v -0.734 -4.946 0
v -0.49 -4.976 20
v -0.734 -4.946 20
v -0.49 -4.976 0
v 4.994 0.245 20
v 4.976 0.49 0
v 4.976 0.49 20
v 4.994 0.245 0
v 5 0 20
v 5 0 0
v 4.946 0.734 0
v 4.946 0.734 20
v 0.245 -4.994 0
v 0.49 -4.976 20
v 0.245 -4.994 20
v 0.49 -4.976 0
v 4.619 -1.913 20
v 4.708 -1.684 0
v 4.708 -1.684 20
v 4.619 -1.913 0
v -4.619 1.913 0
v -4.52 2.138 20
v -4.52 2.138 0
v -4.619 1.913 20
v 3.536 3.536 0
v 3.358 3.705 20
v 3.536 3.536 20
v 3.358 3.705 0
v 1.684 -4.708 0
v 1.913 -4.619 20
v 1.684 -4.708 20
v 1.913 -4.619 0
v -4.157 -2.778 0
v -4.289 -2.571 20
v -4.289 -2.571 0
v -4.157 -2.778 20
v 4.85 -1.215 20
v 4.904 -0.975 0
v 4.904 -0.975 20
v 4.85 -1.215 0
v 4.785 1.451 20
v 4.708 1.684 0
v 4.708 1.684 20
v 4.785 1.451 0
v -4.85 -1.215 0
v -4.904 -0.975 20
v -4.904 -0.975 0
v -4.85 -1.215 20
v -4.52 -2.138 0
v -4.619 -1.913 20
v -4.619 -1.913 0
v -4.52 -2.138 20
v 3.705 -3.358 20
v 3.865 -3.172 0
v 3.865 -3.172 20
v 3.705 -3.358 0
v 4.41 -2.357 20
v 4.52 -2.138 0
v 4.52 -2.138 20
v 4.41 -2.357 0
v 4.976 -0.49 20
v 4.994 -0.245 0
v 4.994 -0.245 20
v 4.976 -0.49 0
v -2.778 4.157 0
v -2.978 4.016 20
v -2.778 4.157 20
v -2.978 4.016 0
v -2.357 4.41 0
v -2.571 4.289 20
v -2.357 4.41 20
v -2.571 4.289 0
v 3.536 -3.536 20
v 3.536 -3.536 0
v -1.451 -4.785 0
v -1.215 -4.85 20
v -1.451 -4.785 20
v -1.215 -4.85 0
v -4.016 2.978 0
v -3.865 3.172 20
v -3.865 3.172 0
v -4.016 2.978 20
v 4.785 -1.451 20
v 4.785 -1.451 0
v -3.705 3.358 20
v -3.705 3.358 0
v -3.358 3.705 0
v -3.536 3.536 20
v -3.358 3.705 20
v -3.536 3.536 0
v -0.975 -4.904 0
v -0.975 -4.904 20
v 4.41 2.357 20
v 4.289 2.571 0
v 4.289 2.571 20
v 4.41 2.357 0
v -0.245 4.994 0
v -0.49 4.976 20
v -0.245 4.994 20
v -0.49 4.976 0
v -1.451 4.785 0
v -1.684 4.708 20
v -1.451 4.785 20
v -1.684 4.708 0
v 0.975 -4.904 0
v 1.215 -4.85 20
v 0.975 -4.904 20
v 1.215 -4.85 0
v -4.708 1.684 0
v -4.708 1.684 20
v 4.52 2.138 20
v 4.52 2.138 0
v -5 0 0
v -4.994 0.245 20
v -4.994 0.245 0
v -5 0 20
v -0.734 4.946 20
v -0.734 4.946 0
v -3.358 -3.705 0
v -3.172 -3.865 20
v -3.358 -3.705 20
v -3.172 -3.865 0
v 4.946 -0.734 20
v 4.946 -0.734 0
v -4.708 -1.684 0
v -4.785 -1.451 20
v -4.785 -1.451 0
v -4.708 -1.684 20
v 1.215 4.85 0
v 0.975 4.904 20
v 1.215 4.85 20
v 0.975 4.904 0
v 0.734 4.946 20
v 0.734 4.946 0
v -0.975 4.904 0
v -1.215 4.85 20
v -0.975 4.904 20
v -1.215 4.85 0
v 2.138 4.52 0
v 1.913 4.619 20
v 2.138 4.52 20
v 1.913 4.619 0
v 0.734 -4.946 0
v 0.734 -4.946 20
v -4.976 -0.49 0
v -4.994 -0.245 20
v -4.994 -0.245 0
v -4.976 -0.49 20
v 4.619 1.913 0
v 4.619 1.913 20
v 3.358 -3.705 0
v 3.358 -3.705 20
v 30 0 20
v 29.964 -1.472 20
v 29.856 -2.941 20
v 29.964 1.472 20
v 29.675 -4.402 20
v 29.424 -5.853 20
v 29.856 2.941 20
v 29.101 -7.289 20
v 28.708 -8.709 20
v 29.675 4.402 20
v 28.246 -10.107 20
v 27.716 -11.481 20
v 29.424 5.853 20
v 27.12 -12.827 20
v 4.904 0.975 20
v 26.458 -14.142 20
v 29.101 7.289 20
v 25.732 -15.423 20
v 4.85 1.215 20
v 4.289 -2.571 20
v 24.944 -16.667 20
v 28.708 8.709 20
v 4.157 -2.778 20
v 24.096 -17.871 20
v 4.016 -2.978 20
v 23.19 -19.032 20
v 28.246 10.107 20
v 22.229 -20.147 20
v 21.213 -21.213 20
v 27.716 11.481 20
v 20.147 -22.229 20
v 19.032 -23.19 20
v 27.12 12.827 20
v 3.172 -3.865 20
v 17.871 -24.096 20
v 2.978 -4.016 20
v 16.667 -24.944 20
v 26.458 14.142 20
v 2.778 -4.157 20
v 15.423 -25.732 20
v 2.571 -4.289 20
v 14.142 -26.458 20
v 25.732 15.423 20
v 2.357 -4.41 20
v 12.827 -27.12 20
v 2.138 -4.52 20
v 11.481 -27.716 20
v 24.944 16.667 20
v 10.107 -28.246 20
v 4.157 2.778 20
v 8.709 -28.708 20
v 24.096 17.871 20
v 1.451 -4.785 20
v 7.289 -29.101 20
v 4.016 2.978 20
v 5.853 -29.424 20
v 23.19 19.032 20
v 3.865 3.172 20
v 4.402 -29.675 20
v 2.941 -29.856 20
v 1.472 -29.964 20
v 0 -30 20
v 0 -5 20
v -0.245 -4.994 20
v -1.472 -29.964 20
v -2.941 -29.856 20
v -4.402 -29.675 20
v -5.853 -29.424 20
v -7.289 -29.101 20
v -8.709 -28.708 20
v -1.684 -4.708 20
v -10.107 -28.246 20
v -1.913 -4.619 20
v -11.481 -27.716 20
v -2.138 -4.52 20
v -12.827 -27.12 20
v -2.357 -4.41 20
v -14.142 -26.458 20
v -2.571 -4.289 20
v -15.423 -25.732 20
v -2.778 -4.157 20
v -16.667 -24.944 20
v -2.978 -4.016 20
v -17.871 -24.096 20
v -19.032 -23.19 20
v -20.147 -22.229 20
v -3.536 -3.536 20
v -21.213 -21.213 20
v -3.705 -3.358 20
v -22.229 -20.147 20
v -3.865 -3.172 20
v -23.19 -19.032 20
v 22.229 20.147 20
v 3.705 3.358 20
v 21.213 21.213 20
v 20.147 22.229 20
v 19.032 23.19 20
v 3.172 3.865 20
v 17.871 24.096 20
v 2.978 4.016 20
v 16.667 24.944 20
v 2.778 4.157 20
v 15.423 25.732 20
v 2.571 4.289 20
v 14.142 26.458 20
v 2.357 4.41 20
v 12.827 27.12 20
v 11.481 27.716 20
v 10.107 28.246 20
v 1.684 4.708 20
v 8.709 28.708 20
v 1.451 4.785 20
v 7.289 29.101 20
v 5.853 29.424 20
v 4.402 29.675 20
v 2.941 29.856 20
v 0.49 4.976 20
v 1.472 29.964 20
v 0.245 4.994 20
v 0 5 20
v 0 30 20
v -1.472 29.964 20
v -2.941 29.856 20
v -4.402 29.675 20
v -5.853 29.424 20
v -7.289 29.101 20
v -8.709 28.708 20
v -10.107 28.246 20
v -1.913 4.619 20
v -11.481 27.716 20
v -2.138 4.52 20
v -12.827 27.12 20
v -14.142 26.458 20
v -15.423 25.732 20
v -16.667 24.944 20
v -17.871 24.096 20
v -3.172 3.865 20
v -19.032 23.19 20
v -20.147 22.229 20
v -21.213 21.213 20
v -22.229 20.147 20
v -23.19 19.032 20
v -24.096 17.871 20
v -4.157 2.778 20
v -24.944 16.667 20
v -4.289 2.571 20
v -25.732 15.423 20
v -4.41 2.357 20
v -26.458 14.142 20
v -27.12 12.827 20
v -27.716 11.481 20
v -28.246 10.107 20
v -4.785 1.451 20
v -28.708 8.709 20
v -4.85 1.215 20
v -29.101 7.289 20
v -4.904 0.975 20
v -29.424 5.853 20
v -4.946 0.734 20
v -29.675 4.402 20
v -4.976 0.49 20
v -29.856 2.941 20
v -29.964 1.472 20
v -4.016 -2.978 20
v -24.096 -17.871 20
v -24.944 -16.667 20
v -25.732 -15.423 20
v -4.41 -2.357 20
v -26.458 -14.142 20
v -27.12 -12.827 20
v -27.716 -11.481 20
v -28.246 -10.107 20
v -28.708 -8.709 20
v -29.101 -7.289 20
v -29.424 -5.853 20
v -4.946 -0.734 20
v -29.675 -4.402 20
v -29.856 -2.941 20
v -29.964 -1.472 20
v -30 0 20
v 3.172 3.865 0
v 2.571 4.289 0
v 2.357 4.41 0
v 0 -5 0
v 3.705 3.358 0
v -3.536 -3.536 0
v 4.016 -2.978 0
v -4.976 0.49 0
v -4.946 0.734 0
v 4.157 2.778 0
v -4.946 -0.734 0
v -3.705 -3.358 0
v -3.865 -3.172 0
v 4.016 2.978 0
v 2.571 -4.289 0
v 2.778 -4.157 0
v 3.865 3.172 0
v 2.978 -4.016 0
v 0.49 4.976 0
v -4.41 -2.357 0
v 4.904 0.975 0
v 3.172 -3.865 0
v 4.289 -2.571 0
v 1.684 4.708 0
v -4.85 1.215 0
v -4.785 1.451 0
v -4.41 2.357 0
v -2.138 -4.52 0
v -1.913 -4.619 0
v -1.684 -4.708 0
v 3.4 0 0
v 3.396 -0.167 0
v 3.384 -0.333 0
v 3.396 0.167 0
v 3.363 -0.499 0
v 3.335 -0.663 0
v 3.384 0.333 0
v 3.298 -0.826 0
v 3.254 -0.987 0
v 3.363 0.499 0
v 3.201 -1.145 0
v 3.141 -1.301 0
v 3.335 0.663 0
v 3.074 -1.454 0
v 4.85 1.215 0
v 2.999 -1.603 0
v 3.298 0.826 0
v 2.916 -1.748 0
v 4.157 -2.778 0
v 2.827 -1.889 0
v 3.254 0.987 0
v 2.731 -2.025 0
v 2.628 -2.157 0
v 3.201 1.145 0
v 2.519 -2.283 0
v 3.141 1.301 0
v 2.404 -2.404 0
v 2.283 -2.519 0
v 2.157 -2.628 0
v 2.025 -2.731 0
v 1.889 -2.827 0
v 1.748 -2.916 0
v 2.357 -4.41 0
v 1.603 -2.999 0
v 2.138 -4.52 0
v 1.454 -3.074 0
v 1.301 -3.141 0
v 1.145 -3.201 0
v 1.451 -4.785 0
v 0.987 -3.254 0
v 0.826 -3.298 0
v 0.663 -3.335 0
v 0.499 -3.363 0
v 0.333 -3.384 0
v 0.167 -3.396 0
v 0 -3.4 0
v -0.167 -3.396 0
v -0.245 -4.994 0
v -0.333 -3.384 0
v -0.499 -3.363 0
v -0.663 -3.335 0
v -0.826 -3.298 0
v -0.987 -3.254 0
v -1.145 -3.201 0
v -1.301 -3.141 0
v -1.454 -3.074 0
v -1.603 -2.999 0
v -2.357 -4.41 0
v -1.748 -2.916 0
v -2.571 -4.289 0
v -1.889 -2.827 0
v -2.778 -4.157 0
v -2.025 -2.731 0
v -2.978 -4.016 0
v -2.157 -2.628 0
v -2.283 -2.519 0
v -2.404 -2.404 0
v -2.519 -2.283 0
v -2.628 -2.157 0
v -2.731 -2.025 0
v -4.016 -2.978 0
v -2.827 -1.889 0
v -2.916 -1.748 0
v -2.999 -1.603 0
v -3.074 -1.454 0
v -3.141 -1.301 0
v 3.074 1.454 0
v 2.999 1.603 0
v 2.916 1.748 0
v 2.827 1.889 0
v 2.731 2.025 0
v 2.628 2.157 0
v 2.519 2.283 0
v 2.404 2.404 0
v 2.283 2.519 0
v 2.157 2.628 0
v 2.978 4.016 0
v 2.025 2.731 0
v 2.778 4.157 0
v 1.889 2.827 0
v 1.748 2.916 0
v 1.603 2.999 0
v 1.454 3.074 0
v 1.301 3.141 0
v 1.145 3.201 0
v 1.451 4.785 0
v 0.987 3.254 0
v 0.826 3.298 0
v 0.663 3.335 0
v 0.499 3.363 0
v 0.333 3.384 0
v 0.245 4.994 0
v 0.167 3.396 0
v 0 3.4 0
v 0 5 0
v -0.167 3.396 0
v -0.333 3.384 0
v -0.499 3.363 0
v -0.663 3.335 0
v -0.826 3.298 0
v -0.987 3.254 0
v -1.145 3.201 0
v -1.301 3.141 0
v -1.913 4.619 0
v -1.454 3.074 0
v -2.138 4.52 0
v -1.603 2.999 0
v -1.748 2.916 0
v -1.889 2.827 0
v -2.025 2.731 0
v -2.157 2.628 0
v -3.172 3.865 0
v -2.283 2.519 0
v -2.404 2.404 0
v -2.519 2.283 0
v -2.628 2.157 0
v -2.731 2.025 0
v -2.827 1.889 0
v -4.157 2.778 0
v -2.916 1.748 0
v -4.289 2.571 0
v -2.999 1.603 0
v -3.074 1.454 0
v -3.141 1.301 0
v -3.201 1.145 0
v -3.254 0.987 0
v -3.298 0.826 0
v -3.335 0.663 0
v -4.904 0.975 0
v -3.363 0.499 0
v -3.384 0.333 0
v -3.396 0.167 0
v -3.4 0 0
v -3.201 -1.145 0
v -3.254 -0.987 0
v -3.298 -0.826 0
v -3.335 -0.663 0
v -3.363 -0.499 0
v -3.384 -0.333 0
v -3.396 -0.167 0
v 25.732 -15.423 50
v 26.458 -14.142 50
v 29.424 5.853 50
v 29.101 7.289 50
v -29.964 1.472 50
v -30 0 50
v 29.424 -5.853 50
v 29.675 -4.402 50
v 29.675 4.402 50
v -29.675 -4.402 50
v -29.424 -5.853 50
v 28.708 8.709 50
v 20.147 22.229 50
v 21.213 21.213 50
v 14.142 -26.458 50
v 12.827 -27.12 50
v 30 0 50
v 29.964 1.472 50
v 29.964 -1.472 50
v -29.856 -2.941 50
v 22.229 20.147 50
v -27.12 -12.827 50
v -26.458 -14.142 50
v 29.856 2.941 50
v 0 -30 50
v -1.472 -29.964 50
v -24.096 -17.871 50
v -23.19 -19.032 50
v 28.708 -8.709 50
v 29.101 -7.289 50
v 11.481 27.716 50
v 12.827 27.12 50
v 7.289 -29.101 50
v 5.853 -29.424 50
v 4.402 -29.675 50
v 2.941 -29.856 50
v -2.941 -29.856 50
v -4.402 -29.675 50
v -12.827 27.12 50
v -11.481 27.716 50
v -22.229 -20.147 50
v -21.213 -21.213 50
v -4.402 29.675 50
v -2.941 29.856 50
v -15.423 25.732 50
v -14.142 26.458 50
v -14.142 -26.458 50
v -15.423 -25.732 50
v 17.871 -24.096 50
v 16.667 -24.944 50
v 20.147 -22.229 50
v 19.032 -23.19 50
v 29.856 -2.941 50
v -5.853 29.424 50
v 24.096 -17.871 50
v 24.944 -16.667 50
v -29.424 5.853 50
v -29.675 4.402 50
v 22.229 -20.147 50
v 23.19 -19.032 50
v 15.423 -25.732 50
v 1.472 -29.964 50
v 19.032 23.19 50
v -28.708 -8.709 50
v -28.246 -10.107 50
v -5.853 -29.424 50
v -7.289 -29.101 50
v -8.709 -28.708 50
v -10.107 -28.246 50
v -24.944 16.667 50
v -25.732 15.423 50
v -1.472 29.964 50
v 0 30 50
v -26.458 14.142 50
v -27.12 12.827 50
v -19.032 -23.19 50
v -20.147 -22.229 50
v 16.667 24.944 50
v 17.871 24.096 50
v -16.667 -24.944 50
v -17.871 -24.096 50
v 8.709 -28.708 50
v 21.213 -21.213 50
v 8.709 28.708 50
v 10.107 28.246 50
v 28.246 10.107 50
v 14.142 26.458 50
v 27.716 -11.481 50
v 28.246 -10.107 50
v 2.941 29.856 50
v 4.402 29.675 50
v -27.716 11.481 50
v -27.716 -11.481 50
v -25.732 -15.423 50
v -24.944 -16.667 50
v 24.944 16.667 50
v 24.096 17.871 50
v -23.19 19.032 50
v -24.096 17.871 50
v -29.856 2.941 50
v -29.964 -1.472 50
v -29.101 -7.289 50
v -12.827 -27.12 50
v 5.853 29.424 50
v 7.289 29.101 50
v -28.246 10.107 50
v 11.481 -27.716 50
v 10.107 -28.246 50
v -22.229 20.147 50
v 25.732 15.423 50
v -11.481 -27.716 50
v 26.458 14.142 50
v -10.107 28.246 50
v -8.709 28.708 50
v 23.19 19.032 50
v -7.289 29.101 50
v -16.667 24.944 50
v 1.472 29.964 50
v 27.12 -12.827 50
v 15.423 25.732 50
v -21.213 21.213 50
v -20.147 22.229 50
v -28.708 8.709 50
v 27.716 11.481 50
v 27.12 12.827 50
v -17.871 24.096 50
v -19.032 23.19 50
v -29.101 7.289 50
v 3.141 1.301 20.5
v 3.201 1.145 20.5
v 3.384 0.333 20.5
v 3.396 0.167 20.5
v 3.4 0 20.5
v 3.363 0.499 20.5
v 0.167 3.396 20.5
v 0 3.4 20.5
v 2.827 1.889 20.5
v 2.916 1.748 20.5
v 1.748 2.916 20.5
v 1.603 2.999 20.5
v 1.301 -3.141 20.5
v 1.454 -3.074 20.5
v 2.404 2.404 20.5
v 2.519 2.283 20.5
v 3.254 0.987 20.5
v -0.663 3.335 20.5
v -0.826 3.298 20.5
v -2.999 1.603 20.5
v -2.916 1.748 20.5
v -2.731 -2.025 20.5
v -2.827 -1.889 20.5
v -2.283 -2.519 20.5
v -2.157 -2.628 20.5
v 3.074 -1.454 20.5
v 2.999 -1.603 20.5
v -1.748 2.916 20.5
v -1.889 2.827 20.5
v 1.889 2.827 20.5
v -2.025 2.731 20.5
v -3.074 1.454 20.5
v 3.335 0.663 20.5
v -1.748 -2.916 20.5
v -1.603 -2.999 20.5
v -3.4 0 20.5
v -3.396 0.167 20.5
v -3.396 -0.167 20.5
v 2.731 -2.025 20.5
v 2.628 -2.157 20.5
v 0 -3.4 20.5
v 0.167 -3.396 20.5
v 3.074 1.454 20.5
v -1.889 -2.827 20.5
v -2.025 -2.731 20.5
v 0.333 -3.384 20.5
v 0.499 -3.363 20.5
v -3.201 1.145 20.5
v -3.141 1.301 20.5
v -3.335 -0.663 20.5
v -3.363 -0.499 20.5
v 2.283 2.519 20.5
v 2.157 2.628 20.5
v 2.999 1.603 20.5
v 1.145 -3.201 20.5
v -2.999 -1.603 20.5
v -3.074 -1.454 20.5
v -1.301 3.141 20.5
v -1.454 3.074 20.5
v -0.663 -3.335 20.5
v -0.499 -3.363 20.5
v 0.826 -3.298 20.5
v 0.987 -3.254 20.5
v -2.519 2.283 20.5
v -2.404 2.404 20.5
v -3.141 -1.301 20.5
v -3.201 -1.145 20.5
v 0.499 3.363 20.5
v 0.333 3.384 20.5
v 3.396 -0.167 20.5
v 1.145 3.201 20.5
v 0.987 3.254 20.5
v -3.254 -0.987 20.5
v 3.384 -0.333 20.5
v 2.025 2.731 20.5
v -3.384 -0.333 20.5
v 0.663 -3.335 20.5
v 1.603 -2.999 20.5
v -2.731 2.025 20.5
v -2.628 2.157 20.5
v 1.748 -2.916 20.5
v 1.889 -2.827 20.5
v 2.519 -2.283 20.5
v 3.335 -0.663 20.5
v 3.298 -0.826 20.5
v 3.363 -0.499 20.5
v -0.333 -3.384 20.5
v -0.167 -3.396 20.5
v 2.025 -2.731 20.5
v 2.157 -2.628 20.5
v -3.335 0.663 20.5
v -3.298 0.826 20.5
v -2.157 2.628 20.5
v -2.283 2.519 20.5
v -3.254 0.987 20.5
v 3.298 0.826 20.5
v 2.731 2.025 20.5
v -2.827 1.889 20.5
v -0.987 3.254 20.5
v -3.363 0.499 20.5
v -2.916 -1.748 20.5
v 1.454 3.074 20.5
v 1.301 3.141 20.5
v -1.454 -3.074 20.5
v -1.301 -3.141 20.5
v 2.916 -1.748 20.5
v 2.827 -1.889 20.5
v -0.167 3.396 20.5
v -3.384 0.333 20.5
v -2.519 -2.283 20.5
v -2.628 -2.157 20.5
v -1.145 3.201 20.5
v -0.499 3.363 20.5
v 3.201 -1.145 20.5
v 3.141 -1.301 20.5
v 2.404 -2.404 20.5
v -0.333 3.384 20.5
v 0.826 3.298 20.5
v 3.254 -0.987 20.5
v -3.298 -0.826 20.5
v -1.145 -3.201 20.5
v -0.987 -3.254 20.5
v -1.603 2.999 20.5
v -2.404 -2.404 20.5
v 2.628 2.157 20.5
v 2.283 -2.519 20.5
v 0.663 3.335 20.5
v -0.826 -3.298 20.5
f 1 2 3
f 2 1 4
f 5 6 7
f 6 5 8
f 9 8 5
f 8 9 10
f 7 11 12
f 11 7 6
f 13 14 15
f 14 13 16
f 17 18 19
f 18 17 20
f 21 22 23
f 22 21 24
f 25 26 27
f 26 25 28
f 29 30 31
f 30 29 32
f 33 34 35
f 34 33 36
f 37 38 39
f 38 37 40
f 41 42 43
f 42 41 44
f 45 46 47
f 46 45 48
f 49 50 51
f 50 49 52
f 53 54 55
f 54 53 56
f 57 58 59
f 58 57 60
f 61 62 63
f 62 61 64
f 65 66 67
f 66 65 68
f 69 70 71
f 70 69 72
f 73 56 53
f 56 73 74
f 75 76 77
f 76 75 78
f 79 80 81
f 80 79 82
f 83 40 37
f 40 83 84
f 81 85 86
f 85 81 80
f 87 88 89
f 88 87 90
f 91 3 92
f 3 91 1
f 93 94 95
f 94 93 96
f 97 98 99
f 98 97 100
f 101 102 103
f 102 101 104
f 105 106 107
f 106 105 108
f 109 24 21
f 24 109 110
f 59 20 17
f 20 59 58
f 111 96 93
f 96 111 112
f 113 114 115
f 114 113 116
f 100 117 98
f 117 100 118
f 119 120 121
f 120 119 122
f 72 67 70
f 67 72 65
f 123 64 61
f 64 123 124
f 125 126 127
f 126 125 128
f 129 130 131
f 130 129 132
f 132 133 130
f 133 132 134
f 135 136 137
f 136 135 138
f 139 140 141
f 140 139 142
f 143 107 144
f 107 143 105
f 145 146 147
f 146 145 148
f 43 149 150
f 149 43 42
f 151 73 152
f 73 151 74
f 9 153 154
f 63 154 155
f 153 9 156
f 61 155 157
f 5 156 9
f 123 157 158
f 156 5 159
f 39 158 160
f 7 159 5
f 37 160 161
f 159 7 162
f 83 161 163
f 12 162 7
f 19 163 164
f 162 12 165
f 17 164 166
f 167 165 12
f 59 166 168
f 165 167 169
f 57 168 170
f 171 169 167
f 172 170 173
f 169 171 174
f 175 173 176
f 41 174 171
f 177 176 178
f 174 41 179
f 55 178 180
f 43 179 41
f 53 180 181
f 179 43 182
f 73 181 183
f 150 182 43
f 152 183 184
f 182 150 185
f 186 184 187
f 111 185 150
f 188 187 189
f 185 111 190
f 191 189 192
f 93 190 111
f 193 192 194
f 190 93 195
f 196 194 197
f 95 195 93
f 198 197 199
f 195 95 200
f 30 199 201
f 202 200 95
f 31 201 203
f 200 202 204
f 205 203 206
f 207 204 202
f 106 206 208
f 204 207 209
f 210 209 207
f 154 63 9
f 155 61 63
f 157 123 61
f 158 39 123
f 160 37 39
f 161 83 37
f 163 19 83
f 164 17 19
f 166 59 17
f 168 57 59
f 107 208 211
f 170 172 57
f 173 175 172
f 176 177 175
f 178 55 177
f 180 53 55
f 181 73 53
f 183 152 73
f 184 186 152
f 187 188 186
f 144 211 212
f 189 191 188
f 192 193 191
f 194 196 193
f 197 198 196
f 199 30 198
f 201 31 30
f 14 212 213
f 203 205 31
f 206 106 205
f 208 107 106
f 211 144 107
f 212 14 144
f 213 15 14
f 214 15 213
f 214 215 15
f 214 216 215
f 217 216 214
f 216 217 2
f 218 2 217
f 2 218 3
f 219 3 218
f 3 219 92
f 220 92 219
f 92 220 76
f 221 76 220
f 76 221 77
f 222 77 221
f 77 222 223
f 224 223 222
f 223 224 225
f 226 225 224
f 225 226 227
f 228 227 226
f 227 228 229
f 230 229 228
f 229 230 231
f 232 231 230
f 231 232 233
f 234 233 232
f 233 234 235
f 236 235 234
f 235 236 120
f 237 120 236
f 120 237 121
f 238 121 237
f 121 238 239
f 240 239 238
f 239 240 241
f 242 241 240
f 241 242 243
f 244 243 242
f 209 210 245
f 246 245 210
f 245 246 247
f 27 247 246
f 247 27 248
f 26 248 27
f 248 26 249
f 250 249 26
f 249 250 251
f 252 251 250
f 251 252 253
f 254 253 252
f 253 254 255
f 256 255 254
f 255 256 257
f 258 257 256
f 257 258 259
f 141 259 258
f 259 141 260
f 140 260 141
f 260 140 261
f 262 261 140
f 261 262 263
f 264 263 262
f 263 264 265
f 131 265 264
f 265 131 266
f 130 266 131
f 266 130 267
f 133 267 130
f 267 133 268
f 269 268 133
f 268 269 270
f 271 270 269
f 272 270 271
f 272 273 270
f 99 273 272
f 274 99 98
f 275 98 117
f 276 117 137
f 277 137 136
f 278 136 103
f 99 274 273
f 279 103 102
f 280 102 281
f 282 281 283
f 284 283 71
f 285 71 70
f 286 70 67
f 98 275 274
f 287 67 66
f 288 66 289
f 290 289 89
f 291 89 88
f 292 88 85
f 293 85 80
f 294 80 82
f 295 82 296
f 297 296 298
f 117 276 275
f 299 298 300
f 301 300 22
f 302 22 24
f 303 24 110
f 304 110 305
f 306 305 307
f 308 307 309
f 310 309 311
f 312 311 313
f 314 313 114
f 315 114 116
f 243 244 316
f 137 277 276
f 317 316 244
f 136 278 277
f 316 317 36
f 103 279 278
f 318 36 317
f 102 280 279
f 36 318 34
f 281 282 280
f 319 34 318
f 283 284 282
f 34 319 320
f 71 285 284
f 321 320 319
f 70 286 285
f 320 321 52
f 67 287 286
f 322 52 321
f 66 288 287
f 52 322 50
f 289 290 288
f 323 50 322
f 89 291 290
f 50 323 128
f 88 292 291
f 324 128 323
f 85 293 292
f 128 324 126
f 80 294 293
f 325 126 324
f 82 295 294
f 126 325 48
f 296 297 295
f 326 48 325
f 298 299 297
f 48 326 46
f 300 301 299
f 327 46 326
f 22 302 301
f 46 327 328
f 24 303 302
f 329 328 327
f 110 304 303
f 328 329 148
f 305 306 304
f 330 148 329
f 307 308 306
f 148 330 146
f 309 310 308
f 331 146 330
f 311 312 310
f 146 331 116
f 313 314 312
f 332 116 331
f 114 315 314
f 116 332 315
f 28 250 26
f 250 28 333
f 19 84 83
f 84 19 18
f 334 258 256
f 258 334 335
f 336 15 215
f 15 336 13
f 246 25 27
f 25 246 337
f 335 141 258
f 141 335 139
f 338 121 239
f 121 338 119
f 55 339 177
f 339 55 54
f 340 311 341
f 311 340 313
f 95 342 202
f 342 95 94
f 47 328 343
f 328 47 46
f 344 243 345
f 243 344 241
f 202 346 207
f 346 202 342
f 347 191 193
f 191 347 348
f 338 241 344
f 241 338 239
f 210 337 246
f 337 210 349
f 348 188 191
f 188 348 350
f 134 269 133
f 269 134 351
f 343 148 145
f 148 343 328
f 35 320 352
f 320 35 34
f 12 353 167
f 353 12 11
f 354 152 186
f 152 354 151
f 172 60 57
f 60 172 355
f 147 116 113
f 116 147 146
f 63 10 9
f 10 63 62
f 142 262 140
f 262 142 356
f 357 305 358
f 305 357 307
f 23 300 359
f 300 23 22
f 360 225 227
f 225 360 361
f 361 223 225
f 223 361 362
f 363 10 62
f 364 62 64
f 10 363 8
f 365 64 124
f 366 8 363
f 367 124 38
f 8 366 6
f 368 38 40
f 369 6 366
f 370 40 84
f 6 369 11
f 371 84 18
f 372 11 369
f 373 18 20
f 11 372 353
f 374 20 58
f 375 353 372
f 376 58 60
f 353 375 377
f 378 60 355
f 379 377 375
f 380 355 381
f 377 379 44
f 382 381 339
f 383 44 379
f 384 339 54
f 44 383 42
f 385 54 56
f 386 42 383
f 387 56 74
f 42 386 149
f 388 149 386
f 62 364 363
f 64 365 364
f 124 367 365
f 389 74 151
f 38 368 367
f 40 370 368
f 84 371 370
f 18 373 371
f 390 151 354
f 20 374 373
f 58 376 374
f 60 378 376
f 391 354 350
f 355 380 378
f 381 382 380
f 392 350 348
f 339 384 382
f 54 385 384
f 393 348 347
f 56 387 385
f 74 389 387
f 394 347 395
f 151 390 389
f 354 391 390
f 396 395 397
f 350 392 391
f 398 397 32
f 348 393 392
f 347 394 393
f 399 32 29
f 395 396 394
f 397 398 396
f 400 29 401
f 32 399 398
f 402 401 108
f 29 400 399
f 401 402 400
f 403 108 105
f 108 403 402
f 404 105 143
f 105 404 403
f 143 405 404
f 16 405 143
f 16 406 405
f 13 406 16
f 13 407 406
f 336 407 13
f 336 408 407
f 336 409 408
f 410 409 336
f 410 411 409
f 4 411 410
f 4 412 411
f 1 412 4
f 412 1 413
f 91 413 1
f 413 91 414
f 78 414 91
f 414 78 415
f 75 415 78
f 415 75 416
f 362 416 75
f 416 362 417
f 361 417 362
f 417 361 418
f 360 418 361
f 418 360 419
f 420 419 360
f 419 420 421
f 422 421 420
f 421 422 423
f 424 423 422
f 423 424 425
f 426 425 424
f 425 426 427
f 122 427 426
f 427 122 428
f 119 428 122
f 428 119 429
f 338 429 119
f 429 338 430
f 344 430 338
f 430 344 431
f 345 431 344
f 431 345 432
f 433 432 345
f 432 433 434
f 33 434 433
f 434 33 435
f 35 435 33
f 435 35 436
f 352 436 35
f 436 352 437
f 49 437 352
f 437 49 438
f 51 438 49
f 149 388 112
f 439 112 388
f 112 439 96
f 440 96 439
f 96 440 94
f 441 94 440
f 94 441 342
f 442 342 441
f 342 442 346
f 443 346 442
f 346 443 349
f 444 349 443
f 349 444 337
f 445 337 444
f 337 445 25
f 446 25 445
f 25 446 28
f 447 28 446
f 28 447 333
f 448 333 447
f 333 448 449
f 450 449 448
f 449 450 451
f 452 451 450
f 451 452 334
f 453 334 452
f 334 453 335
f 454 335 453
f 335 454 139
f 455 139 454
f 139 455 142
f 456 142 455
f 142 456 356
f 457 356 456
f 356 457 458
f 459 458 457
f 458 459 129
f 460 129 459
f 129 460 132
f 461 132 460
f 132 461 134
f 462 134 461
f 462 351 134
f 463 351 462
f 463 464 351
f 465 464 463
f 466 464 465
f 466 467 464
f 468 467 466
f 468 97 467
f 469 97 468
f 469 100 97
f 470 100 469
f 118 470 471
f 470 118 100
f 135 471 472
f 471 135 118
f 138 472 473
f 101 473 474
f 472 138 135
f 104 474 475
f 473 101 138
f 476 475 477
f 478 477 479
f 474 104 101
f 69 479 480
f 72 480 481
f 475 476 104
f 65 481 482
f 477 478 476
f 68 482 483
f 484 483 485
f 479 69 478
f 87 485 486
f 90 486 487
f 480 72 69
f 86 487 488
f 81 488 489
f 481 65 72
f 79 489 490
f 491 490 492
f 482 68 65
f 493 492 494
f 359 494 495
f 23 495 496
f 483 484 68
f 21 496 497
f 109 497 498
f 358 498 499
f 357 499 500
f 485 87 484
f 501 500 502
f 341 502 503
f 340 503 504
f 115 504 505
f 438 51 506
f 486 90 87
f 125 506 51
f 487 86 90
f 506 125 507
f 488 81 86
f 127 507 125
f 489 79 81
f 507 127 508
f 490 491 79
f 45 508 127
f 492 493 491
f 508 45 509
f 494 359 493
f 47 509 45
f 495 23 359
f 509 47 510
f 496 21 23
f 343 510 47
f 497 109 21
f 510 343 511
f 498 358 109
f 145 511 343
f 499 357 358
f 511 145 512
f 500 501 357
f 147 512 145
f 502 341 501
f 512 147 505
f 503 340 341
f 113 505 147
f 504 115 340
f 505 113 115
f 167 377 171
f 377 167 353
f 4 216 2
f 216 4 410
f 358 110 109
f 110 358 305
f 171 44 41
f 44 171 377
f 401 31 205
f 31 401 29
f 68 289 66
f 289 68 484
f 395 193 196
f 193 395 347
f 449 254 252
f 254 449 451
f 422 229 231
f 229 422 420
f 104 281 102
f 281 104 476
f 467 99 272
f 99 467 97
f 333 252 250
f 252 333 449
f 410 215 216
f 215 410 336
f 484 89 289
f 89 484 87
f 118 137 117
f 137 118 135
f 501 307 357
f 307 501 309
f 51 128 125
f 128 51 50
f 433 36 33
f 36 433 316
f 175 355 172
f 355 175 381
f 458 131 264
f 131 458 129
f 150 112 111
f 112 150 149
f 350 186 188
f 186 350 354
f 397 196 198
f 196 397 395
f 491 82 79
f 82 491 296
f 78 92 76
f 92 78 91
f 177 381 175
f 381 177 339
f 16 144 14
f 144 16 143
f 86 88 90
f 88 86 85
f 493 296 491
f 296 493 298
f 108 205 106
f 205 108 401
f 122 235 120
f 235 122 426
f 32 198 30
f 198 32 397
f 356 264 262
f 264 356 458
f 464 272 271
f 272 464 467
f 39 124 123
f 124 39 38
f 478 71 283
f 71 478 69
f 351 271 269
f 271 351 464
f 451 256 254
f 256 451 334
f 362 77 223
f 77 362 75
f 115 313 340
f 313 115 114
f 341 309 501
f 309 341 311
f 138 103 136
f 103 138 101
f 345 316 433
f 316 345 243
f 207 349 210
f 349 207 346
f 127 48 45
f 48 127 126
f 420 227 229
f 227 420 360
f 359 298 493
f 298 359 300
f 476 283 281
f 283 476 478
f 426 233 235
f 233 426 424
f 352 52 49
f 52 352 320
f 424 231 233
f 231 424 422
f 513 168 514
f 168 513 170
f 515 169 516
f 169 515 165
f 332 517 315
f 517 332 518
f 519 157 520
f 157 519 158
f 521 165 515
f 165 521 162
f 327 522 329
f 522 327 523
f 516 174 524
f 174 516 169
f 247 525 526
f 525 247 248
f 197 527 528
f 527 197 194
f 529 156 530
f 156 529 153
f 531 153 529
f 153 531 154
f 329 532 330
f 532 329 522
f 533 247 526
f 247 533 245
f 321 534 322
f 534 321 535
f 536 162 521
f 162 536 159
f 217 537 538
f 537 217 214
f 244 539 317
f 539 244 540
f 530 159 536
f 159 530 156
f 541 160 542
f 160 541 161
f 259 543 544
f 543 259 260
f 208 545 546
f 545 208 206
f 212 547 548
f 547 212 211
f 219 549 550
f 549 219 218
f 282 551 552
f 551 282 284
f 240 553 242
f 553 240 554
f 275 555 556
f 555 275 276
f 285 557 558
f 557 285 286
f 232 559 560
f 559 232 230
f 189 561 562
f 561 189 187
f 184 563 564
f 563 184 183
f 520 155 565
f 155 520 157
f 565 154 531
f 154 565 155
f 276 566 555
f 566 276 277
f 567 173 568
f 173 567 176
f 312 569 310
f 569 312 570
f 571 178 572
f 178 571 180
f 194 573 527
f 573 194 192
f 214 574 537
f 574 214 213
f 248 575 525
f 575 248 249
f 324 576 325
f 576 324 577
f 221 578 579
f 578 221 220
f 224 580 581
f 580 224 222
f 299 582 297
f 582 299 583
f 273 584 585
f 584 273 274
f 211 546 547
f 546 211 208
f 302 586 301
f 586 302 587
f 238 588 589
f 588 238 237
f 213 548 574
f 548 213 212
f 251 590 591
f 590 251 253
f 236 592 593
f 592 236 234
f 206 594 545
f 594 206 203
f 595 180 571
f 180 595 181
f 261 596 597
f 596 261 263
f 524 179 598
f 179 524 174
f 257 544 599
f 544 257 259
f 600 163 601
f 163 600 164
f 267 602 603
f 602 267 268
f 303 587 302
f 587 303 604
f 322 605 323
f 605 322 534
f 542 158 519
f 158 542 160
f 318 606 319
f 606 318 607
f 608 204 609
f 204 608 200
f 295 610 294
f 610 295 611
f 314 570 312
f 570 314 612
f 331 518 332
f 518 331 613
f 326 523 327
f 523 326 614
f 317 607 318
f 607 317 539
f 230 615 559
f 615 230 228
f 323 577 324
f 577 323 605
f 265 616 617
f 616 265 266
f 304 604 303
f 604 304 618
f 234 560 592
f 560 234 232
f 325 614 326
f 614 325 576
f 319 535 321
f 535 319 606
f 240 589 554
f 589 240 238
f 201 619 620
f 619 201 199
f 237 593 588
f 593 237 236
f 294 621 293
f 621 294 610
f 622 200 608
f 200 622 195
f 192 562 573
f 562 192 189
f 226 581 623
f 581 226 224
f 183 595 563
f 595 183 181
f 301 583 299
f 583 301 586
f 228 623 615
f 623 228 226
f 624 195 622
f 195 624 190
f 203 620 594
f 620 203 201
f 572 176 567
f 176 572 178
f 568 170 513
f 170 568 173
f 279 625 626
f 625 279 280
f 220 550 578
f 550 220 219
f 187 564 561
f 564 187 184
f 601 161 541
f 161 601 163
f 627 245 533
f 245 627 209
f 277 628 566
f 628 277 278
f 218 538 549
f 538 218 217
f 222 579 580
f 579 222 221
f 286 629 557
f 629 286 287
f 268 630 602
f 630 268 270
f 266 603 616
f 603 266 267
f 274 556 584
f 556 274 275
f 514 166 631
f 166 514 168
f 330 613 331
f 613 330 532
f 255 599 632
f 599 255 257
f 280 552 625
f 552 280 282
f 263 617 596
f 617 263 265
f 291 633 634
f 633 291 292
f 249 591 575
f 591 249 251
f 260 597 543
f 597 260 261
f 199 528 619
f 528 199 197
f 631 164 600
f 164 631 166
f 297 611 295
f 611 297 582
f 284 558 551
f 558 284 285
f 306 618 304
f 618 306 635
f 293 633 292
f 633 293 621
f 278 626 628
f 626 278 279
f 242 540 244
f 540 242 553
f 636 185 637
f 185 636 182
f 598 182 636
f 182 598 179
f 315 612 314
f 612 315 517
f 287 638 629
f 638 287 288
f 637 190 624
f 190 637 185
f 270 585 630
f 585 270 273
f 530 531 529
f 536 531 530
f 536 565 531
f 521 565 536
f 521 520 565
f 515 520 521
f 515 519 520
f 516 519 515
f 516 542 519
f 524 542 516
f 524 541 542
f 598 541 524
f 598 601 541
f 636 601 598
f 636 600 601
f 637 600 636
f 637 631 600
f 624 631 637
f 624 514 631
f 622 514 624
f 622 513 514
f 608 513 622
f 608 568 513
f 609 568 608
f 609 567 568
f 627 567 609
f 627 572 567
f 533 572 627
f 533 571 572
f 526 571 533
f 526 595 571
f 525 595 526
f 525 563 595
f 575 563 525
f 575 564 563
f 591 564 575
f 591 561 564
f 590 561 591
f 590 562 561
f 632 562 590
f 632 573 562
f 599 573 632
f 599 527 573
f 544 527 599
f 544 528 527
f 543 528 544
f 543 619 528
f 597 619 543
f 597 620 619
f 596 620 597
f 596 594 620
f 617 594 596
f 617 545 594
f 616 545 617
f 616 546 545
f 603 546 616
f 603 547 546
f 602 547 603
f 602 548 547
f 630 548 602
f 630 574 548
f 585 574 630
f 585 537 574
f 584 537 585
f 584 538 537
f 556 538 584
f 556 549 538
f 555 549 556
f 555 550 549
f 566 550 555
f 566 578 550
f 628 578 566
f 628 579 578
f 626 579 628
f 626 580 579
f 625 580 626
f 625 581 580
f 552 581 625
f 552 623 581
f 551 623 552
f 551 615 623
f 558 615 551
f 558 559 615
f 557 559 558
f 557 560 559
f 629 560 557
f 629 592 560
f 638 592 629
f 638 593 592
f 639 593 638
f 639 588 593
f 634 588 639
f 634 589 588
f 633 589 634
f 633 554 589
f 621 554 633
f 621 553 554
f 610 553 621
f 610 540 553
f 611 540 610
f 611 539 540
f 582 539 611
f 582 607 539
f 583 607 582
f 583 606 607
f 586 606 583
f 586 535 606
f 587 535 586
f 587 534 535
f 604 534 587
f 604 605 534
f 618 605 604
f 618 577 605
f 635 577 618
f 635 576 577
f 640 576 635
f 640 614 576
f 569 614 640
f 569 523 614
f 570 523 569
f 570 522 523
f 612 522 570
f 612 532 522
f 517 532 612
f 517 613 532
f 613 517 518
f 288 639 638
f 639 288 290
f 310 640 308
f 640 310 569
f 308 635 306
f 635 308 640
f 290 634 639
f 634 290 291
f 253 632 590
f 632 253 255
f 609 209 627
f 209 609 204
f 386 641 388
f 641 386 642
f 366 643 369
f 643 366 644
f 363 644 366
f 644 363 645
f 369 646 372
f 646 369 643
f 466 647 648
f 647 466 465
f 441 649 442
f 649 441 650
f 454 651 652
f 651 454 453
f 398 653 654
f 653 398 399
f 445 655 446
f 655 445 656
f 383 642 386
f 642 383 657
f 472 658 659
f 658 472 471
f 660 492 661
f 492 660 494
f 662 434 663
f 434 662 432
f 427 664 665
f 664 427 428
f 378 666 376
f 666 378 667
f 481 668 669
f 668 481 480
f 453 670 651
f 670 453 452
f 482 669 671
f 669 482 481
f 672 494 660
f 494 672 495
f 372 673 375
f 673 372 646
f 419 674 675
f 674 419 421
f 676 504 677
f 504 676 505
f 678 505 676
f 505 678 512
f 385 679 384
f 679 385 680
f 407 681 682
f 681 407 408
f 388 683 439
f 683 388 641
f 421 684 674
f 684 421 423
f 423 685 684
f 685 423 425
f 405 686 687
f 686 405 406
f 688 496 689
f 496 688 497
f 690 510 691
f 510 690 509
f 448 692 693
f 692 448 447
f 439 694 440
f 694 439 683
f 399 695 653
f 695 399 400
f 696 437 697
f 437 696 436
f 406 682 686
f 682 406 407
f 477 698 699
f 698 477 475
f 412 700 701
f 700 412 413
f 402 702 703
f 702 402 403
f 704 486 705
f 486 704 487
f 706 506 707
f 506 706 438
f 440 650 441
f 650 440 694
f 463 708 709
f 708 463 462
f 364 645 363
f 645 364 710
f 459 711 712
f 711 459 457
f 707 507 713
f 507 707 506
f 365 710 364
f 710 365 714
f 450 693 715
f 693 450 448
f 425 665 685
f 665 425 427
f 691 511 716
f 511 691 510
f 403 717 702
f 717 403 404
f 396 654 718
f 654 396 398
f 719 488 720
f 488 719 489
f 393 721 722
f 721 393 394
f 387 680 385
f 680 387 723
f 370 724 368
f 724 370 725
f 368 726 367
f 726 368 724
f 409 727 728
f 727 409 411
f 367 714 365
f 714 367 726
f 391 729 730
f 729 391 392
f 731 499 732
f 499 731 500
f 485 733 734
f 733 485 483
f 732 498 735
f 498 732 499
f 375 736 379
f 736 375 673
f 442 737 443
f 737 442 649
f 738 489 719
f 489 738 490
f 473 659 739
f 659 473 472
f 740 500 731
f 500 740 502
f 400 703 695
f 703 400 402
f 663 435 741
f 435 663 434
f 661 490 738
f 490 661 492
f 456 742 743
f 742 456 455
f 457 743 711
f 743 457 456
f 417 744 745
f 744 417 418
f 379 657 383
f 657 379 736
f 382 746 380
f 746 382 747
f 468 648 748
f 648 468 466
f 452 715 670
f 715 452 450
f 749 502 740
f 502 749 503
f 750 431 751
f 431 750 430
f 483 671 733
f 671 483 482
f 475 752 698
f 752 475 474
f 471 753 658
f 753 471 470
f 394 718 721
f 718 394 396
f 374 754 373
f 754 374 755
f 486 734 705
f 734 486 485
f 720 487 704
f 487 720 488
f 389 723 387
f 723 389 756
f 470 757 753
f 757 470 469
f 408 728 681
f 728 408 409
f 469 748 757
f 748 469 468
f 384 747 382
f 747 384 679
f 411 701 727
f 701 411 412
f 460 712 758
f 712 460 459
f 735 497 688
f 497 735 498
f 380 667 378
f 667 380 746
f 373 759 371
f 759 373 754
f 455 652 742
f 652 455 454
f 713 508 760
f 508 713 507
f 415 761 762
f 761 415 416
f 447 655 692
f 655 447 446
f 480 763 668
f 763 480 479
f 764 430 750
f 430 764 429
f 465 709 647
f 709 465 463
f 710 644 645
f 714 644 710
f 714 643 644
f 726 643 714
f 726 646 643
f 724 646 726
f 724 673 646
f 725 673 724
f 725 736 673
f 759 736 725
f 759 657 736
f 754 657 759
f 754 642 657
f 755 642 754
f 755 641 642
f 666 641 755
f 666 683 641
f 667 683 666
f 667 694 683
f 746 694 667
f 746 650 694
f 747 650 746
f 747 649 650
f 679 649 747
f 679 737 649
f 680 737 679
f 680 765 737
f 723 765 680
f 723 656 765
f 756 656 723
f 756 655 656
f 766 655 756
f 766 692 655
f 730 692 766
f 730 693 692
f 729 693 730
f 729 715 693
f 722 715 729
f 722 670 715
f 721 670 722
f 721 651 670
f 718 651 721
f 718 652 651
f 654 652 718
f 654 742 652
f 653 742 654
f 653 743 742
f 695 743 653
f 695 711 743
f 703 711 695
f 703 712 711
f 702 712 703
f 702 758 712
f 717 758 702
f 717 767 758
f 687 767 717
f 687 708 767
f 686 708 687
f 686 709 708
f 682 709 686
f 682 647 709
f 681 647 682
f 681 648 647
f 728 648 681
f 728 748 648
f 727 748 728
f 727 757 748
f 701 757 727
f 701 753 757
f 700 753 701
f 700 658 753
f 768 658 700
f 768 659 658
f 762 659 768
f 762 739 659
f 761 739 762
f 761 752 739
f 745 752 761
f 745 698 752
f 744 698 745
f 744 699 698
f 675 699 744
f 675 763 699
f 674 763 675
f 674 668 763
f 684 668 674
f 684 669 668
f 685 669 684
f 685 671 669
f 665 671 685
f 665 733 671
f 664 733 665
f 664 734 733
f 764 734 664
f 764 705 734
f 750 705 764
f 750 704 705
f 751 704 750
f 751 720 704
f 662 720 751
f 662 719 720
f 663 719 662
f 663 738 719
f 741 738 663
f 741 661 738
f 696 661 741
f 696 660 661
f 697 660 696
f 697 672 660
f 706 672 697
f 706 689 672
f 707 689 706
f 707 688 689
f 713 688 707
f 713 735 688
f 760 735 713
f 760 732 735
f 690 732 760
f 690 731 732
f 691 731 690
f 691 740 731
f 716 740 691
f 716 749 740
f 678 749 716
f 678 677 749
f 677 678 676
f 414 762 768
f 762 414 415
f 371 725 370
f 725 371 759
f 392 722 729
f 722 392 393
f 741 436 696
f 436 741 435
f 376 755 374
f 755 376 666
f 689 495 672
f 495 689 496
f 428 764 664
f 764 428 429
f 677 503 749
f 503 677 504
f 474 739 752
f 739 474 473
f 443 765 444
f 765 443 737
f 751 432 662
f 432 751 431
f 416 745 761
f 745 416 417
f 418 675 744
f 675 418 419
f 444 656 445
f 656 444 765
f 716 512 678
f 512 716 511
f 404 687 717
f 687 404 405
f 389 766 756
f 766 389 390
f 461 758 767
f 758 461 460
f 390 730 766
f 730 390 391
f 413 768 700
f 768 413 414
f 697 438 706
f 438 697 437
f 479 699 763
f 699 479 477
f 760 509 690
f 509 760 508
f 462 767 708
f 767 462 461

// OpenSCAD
// Small lab funnel - printed upright, open top and bottom
// Units: mm. One complete part, no external libraries.

// ---- Parameters ----
spout_od      = 10;    // spout outer diameter
spout_length  = 20;    // spout runs from z = 0 to z = 20
cone_base_d   = 60;    // cone rim (base) outer diameter at z = 50
cone_top_d    = 10;    // cone outer diameter where it meets the spout (z = 20)
cone_height   = 30;    // cone runs from z = 20 to z = 50 (50 - 20)
wall          = 1.6;   // uniform wall thickness for spout and cone
eps           = 0.5;   // cutter overshoot past faces

$fn = 128;             // smoothness of curved surfaces

// ---- Derived ----
spout_id = spout_od - 2 * wall;   // spout bore diameter (6.8 mm)

// ---- Model ----
difference() {
    union() {
        // Spout: straight tube from z = 0 to z = 20
        cylinder(d = spout_od, h = spout_length);

        // Cone: widens from z = 20 to z = 50
        translate([0, 0, spout_length])
            linear_extrude(height = cone_height)
                circle(d = cone_base_d, center = true);
    }

    // Through-bore: spout bore extended into the cone along the same axis
    translate([0, 0, -eps])
        cylinder(d = spout_id, h = spout_length + 2 * eps);
}
